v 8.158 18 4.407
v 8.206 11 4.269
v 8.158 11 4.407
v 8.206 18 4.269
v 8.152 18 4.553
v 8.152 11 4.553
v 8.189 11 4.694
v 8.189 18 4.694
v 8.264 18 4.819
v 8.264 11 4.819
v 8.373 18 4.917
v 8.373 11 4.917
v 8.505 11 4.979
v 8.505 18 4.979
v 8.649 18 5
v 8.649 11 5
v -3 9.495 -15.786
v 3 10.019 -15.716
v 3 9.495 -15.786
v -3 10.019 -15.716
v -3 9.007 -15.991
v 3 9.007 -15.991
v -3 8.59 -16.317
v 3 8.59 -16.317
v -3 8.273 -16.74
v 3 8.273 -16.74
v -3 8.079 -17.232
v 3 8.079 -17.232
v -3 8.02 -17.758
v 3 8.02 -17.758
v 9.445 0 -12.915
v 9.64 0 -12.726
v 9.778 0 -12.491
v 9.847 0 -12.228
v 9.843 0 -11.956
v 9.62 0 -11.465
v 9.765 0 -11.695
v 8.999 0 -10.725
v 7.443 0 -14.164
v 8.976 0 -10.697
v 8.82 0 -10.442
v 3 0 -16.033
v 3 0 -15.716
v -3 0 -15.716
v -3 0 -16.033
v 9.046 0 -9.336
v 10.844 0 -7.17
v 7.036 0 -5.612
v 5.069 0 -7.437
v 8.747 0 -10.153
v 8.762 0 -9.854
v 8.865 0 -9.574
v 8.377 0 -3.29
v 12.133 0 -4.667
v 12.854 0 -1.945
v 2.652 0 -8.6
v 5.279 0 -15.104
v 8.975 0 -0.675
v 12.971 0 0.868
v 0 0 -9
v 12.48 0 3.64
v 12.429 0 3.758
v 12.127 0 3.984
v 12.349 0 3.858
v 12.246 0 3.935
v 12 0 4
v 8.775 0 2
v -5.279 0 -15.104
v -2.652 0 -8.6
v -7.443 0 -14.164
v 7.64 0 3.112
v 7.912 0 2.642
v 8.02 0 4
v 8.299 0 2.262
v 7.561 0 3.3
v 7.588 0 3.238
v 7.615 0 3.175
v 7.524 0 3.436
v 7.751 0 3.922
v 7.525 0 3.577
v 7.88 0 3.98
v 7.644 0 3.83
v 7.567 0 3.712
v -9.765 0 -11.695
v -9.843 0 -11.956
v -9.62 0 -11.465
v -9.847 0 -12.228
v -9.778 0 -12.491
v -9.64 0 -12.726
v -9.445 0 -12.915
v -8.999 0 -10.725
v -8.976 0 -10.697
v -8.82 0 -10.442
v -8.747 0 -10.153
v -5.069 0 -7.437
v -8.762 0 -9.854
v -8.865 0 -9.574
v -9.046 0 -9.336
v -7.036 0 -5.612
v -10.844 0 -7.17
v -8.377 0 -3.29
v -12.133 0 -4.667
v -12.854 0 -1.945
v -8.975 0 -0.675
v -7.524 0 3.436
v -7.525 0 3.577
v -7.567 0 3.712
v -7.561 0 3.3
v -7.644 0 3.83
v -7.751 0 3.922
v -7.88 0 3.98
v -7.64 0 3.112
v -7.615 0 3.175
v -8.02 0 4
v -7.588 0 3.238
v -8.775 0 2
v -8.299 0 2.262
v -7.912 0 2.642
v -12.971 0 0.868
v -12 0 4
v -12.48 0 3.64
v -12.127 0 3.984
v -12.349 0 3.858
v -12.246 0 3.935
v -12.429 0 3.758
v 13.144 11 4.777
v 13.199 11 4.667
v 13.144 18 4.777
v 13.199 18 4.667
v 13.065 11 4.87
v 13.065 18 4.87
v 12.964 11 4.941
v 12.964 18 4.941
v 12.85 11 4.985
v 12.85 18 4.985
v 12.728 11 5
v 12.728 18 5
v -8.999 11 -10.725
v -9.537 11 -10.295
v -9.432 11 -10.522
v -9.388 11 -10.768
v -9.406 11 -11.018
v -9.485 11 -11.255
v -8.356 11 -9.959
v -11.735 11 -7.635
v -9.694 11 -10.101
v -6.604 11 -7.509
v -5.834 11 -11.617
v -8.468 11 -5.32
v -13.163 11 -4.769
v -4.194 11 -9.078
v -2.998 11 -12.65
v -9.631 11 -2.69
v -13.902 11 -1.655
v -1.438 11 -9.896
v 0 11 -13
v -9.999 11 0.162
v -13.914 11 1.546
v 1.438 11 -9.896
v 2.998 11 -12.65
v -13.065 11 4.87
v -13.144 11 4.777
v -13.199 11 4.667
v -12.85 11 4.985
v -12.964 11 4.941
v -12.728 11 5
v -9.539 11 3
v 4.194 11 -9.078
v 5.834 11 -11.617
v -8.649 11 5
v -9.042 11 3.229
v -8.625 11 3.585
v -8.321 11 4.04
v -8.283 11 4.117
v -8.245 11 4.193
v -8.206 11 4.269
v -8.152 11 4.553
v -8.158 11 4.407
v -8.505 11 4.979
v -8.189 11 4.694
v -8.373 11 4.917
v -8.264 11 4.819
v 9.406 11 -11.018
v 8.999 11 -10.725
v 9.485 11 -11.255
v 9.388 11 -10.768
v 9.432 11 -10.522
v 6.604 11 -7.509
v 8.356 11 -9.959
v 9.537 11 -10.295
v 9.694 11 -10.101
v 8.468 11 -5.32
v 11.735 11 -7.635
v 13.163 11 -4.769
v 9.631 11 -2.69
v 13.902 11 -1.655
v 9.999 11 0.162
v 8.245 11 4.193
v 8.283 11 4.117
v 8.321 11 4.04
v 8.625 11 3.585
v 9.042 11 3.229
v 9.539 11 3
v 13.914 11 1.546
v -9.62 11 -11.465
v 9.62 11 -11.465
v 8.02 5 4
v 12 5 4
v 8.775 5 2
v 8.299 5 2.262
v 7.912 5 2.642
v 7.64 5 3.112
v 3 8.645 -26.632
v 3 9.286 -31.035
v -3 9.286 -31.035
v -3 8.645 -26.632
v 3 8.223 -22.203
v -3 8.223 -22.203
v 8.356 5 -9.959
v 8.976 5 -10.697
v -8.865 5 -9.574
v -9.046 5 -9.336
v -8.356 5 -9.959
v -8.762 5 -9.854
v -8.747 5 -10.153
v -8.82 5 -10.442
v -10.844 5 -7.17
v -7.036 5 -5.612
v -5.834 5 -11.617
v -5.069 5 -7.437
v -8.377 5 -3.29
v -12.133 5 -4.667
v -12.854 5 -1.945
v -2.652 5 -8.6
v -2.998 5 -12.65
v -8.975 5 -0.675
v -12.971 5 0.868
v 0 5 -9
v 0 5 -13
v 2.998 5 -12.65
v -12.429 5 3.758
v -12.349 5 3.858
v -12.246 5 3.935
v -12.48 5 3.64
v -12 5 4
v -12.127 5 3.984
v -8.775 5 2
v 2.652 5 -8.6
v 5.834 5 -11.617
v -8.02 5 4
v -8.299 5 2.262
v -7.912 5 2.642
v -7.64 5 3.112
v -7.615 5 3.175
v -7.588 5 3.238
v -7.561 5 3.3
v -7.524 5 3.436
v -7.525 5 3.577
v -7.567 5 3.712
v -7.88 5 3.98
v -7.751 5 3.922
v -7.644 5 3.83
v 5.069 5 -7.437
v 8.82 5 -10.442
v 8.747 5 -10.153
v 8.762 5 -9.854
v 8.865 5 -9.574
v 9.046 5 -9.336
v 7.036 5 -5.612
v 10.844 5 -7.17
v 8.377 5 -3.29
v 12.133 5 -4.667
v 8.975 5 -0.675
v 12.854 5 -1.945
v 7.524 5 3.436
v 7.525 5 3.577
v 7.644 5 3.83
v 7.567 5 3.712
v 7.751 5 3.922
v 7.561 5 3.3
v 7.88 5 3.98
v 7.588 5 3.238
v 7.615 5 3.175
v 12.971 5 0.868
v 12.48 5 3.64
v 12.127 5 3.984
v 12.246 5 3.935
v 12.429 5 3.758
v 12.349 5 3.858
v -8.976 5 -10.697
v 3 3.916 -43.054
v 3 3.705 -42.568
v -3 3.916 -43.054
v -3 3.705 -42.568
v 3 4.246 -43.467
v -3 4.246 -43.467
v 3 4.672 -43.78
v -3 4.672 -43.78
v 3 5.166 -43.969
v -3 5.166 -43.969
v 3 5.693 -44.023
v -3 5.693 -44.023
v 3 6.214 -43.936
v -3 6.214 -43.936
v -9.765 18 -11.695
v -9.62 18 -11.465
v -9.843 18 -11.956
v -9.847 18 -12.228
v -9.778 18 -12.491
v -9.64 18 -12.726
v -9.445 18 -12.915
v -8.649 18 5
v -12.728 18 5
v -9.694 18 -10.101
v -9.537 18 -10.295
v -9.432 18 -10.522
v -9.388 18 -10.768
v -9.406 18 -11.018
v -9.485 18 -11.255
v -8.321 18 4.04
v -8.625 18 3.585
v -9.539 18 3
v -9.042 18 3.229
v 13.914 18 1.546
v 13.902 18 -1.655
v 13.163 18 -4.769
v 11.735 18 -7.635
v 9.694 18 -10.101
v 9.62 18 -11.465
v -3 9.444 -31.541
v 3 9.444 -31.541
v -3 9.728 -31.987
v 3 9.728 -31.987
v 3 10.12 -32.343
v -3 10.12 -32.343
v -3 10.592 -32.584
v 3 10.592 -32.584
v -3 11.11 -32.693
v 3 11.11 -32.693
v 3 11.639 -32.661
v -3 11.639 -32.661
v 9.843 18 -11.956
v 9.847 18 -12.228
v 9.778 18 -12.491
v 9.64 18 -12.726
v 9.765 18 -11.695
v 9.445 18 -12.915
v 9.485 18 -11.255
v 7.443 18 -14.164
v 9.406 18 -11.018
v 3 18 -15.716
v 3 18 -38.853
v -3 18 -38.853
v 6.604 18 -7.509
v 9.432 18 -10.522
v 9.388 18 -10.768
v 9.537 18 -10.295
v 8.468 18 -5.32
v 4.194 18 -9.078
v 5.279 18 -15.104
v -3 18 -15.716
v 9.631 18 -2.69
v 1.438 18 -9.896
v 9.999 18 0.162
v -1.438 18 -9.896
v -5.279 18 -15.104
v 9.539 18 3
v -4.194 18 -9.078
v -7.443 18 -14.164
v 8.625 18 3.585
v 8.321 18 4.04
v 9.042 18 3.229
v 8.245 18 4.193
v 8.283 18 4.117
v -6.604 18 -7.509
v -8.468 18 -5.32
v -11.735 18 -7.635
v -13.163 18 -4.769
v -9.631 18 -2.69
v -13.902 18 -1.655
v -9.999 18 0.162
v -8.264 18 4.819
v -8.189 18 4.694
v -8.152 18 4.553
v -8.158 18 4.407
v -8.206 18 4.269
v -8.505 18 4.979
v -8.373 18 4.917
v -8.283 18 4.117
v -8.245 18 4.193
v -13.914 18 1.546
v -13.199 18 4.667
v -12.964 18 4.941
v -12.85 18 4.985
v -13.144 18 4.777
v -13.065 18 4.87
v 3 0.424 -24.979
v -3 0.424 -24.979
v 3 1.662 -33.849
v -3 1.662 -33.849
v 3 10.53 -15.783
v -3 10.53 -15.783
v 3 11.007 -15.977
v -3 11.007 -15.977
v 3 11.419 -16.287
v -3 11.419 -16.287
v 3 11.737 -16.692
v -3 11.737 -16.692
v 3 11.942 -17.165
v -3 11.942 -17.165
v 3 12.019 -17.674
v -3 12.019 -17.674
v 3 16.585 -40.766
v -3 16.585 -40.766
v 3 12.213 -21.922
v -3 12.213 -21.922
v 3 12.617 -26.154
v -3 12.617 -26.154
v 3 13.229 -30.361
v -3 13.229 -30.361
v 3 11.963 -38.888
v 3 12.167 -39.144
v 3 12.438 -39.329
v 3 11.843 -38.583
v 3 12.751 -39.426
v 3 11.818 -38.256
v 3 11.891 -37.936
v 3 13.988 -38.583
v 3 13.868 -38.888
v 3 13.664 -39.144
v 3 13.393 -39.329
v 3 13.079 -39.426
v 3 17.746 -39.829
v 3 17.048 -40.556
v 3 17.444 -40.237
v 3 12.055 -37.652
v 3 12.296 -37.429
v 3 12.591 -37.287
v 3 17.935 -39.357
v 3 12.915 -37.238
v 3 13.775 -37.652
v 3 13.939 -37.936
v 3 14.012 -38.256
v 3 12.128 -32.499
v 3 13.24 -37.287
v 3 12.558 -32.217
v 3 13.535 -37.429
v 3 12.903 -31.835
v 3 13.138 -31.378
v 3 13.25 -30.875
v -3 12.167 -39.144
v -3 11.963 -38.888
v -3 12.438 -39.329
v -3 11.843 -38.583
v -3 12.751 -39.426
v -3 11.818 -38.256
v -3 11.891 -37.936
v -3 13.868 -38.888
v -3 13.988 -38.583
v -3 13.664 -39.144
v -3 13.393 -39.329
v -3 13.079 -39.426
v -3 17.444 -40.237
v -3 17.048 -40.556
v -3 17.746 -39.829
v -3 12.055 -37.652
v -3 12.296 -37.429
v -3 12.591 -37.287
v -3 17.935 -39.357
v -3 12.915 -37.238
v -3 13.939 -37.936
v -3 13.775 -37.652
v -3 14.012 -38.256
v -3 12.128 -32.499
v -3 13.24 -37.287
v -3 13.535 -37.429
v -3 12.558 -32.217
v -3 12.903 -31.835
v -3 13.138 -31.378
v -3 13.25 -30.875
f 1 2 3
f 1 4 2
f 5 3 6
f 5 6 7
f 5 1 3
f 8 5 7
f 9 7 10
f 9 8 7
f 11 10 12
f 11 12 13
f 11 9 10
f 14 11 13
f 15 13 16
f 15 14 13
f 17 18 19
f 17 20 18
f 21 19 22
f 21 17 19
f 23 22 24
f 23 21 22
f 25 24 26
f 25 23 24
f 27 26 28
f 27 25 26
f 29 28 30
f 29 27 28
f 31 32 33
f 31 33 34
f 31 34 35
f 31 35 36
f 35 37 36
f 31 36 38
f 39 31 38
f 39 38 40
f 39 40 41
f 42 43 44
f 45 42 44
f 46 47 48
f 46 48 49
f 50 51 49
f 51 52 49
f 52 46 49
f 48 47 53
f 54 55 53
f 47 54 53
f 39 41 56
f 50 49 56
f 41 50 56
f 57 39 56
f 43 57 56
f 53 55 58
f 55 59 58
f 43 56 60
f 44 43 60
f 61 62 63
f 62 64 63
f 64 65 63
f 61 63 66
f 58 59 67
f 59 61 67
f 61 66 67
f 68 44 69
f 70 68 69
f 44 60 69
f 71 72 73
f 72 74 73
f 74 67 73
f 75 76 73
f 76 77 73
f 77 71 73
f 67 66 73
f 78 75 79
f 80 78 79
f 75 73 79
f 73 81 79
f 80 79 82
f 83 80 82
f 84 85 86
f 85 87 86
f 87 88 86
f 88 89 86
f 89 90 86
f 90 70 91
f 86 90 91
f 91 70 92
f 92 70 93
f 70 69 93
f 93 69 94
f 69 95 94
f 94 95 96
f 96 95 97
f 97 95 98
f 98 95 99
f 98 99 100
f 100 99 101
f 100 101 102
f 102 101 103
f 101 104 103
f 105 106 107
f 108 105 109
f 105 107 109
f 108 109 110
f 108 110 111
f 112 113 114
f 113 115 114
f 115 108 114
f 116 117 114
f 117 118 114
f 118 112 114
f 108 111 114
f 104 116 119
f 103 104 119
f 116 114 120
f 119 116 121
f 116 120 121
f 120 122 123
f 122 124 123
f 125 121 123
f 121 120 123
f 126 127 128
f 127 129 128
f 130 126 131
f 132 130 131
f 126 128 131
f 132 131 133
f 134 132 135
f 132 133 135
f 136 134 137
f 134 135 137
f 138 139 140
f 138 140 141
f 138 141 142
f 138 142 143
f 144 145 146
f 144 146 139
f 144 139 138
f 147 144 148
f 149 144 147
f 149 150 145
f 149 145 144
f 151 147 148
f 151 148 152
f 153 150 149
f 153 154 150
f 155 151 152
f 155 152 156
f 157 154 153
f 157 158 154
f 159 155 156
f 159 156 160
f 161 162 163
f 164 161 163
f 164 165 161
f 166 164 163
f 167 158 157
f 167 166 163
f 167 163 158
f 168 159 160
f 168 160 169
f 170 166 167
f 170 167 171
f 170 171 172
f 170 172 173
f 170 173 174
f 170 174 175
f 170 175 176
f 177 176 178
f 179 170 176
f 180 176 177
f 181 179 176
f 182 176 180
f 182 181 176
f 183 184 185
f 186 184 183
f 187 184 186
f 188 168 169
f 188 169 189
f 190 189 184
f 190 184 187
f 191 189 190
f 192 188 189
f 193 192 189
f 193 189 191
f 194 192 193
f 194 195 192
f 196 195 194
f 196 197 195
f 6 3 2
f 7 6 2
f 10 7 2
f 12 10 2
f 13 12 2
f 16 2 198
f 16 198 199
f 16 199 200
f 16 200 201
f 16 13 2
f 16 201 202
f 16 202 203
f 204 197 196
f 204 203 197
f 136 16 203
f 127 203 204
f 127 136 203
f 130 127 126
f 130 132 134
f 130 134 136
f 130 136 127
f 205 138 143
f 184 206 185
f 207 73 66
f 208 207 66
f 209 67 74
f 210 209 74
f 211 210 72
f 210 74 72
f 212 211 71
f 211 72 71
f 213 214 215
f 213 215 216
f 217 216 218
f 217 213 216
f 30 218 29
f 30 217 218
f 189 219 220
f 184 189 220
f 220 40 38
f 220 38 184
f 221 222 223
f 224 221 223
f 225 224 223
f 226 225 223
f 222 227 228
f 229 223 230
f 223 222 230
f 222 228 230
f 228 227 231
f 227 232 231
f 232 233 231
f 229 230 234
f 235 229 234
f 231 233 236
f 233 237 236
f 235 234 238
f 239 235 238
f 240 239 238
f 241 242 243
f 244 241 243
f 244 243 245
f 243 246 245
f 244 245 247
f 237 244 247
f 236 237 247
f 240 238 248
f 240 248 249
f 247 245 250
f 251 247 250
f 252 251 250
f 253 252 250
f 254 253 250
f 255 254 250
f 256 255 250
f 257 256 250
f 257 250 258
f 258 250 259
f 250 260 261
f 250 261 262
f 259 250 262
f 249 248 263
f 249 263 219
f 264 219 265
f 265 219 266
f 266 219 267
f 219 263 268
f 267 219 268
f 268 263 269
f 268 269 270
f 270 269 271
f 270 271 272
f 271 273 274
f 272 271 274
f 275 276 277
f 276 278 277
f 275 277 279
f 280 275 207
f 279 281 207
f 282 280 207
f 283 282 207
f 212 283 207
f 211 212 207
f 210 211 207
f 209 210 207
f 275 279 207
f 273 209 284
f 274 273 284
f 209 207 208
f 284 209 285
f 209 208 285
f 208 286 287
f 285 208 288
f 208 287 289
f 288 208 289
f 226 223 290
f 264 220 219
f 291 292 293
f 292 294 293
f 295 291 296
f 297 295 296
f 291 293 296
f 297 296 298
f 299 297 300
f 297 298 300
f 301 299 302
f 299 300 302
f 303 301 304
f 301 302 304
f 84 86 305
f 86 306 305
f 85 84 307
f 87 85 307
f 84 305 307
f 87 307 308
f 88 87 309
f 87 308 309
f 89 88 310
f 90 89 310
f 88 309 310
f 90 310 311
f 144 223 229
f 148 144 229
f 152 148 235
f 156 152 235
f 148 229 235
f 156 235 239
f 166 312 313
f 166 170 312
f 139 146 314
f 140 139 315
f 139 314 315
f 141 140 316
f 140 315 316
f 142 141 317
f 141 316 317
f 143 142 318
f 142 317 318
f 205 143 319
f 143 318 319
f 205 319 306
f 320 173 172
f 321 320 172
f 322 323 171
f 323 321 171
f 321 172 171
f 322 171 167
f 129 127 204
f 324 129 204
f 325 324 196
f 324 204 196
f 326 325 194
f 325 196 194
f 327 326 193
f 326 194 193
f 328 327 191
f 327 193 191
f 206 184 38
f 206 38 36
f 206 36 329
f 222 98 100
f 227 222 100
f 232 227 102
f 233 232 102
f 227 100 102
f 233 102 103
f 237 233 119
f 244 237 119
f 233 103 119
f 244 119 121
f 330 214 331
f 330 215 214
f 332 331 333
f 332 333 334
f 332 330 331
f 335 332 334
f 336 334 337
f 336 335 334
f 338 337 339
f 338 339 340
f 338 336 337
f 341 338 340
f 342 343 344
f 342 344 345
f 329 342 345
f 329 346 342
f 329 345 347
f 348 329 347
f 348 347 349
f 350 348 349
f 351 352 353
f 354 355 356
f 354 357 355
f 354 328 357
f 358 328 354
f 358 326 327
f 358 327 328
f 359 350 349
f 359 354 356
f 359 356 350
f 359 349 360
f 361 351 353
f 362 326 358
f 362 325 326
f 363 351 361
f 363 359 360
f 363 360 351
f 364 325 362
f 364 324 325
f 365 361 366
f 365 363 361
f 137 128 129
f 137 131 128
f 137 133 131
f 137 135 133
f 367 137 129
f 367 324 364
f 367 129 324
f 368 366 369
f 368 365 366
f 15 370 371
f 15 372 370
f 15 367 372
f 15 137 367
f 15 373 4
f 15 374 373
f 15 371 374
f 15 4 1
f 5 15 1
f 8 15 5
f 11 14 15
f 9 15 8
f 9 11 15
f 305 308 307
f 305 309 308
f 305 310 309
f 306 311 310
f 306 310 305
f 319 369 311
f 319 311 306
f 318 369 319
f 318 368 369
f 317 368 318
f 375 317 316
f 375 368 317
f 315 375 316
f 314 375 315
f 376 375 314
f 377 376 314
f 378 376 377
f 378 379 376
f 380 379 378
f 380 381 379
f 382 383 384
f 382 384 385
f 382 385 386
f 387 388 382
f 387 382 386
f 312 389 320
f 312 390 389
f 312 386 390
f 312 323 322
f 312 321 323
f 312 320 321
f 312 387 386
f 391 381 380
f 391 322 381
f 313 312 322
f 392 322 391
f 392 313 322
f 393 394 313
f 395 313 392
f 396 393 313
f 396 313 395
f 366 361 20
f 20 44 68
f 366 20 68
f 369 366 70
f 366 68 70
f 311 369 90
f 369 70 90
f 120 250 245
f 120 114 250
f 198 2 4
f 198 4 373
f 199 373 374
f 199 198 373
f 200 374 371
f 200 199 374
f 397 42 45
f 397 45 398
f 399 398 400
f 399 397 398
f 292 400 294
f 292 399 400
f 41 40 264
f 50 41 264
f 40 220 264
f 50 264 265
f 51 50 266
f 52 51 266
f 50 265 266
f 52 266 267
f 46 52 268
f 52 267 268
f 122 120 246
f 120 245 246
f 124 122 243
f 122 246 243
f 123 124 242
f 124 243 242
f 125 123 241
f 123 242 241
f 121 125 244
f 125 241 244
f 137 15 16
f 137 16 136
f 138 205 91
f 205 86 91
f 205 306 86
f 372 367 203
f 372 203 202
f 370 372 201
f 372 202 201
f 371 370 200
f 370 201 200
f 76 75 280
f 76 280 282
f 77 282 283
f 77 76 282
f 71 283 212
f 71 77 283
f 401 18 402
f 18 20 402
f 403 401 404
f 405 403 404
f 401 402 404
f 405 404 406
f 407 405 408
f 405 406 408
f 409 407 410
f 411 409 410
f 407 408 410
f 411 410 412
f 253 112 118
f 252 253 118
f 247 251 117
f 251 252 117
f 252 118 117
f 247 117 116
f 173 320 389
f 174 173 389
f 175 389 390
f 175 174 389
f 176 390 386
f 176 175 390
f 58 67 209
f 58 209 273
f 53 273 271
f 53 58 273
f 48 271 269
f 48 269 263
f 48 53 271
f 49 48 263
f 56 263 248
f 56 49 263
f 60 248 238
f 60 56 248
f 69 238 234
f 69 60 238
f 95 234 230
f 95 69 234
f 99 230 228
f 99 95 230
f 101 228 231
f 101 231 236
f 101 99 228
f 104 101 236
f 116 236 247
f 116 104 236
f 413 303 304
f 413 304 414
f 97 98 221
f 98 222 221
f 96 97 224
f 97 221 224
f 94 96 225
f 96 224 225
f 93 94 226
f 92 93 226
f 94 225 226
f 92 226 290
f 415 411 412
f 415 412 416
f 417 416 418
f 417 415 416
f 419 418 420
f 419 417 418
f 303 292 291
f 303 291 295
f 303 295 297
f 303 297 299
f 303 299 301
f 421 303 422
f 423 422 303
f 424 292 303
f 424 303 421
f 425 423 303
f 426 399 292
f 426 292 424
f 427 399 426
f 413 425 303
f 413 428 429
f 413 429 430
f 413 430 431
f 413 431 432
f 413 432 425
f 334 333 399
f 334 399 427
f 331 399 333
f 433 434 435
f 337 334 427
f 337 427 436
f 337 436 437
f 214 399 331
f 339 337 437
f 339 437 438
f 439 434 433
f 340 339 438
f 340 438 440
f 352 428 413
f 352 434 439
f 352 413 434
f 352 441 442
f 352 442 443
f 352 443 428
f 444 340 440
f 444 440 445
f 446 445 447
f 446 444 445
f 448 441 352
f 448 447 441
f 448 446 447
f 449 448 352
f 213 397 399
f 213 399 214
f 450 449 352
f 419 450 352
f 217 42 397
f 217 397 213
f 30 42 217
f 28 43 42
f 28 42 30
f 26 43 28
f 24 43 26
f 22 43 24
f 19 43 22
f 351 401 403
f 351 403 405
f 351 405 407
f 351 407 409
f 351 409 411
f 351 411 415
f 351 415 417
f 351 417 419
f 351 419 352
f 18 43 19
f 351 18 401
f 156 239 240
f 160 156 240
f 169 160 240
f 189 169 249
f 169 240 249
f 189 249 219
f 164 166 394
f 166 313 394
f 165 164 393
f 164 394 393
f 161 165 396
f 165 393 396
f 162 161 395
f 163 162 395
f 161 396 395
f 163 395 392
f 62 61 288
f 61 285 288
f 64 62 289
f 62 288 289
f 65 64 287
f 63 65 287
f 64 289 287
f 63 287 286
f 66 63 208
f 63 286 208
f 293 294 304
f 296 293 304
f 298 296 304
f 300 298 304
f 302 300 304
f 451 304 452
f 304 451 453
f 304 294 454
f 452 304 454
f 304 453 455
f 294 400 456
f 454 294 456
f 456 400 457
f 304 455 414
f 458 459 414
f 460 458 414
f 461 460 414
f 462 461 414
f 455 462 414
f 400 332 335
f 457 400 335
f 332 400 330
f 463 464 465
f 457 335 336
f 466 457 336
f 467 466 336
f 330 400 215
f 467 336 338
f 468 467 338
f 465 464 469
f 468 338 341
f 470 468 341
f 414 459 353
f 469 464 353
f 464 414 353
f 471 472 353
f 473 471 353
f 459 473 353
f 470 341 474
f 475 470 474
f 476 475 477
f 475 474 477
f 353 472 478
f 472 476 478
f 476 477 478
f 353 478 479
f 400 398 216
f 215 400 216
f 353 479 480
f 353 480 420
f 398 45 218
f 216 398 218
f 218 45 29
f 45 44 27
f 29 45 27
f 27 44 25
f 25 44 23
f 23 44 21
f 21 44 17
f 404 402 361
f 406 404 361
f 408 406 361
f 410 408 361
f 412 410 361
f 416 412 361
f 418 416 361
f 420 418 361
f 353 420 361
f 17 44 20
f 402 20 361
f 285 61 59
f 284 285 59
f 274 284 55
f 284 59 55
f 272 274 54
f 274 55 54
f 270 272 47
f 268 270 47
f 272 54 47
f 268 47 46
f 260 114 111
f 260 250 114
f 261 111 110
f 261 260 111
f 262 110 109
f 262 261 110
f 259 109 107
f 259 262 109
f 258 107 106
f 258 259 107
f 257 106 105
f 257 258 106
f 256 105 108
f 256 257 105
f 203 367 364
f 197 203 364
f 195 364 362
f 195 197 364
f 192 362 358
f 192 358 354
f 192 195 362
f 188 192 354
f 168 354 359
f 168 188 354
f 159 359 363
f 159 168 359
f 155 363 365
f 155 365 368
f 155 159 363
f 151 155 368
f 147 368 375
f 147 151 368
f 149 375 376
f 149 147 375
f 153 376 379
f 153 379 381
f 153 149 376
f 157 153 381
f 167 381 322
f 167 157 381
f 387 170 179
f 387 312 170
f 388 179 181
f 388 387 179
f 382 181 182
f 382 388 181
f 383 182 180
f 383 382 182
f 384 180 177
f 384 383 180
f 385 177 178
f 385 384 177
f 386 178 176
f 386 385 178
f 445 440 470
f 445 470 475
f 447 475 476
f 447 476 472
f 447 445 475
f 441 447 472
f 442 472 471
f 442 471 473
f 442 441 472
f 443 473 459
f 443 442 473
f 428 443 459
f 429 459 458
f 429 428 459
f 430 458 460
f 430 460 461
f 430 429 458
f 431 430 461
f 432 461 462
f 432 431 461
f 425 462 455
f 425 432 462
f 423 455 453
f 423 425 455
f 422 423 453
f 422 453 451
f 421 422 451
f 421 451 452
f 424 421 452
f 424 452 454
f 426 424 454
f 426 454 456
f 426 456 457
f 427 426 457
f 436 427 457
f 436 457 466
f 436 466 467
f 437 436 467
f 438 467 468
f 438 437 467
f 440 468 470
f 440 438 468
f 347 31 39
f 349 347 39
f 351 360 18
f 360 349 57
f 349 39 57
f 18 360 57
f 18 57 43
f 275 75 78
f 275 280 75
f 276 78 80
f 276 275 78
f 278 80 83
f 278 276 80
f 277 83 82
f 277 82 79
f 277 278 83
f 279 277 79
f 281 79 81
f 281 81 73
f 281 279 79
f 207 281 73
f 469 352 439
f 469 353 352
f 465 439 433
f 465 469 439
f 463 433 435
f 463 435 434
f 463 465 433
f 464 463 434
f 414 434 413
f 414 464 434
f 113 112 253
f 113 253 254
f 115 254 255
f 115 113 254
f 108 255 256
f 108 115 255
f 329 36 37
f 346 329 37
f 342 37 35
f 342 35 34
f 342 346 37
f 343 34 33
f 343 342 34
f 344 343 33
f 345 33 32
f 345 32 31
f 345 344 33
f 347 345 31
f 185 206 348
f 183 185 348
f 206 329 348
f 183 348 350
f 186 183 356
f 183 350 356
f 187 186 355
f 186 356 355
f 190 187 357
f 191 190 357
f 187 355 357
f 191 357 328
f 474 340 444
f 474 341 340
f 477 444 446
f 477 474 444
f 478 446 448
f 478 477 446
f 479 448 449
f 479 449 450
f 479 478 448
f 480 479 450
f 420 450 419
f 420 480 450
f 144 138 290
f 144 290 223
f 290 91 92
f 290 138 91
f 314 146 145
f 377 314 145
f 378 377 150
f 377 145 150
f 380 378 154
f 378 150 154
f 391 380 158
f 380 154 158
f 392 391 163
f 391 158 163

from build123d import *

# Parameters (mm, degrees)
SKETCH1_R              = 13
SKETCH1_R_2            = 9
BOSS_EXTRUDE1_DEPTH    = 5
SKETCH2_R              = 14
SKETCH2_R_2            = 10
BOSS_EXTRUDE2_DEPTH    = 7
CUT_EXTRUDE1_DEPTH     = 7
BOSS_EXTRUDE3_DEPTH    = 5
FILLET1_R              = 2
FILLET2_R              = 0.5
CUT_EXTRUDE2_DEPTH     = 9
BOSS_EXTRUDE4_DEPTH    = 7
FILLET3_R              = 2
FILLET4_R              = 0.5
BOSS_EXTRUDE5_START    = -18
BOSS_EXTRUDE5_DEPTH    = 18
BOSS_EXTRUDE6_START    = -18
BOSS_EXTRUDE6_DEPTH    = 18
SKETCH7_W              = 6
SKETCH7_H              = 18
BOSS_EXTRUDE7_DEPTH    = 28
FILLET5_R              = 1
CUT_EXTRUDE3_START     = -6
CUT_EXTRUDE3_OUTLINE_R = 1.1
CUT_EXTRUDE3_DEPTH     = 6
FILLET7_R              = 2


# Read off the part's stored shape, not the designer's step: Boss-Extrude6, Cut-Extrude3
# Some blends are built 0.0001 mm under size
with BuildPart() as part:
    # Sketch1 → Boss-Extrude1 (new body)
    with BuildSketch(Plane(origin=(0, 0, 0), x_dir=(1, 0, 0), z_dir=(0, 1, 0))):
        with Locations(Location((0, 0, 0), (0, 0, 270))):
            Circle(SKETCH1_R)
        with Locations(Location((0, 0, 0), (0, 0, 270))):
            Circle(SKETCH1_R_2, mode=Mode.SUBTRACT)
    extrude(amount=BOSS_EXTRUDE1_DEPTH)

    # Sketch3 → Cut-Extrude1 (cut)
    with BuildSketch(Plane.XZ):
        with BuildLine():
            ThreePointArc((12.369316877, 4), (0, 13), (-12.369316877, 4))
            Line((-12.369316877, 4), (-8.062257748, 4))
            ThreePointArc((-8.062257748, 4), (0, 9), (8.062257748, 4))
            Line((8.062257748, 4), (12.369316877, 4))
        make_face()
    extrude(amount=-CUT_EXTRUDE1_DEPTH, mode=Mode.SUBTRACT)

    # Sketch3<3> → Boss-Extrude3 (add)
    with BuildSketch(Plane.XZ):
        with BuildLine():
            Line((-7.215434845, 4), (-8.062257748, 4))
            ThreePointArc((-8.062257748, 4), (-8.477795251, 3.02109048), (-8.774964387, 2))
            Line((-8.774964387, 2), (-8.003905297, 2))
            ThreePointArc((-8.003905297, 2), (-7.675094696, 3.025792692), (-7.215434845, 4))
        make_face()
        with BuildLine():
            ThreePointArc((8.774964387, 2), (8.477795251, 3.02109048), (8.062257748, 4))
            Line((8.062257748, 4), (7.215434845, 4))
            ThreePointArc((7.215434845, 4), (7.675094696, 3.025792692), (8.003905297, 2))
            Line((8.003905297, 2), (8.774964387, 2))
        make_face()
    extrude(amount=-BOSS_EXTRUDE3_DEPTH)

    # Fillet1
    # the kernel refuses this fillet: 2 mm, written as the material it takes off along each edge
    with BuildSketch(Plane(origin=(8.003905297, -2.925457541, 2), x_dir=(-0.3106184744402921, 0, 0.9505346723483502), z_dir=(0, 1, 0))) as fillet1_piece_1:
        with BuildLine():
            CenterArc((1.312023382, 1.994963987), FILLET1_R, 219.12562277, 46.807536055)
            Line((-0.239505198, 0.7329184), (-0.27053577, 0.707677488))
            ThreePointArc((-0.27053577, 0.707677488), (-0.157773986, 0.354034461), (-0.038021387, -0.012424739))
            Line((-0.038021387, -0.012424739), (0.002836807, -0.03989928))
            ThreePointArc((0.002836807, -0.03989928), (0.585091508, -0.019226448), (1.167346209, -0.03989928))
            Line((1.167346209, -0.03989928), (1.170183016, 0))
        make_face()
    extrude(amount=10.850915082, mode=Mode.SUBTRACT)
    with BuildSketch(Plane(origin=(-8.003905297, -2.925457541, 2), x_dir=(-1, 0, 0), z_dir=(0, 1, 0))) as fillet1_piece_2:
        with BuildLine():
            CenterArc((1.488743739, 1.866796386), FILLET1_R, 202.16334775, 46.807536055)
            Line((-0.363480463, 1.11229953), (-0.400524947, 1.097209593))
            ThreePointArc((-0.400524947, 1.097209593), (-0.200015637, 0.550177675), (-0.038806814, -0.00969697))
            Line((-0.038806814, -0.00969697), (0, -0.04))
            ThreePointArc((0, -0.04), (0.385529545, -0.04), (0.756705398, -0.037335928))
            Line((0.756705398, -0.037335928), (0.771059091, 0))
        make_face()
    extrude(amount=10.850915082, mode=Mode.SUBTRACT)

    # Fillet2
    fillet2_edges = [part.edges().sort_by_distance(p)[0] for p in [
        (-12.369316877, 2.5, 4),
        (12.369316877, 2.5, 4),
        (-7.215434845, 2.5, 4),
        (7.215434845, 2.5, 4),
    ]]
    fillet(fillet2_edges, radius=FILLET2_R)



with BuildPart() as body_2:
    # Sketch2 → Boss-Extrude2 (new body)
    with BuildSketch(Plane(origin=(0, 11, 0), x_dir=(1, 0, 0), z_dir=(0, 1, 0))):
        with Locations(Location((0, 0, 0), (0, 0, 270))):
            Circle(SKETCH2_R)
        with Locations(Location((0, 0, 0), (0, 0, 270))):
            Circle(SKETCH2_R_2, mode=Mode.SUBTRACT)
    extrude(amount=BOSS_EXTRUDE2_DEPTH)

    # Sketch4 → Cut-Extrude2 (cut)
    with BuildSketch(Plane.XZ.offset(-11)):
        with BuildLine():
            ThreePointArc((13.076696831, 5), (0, 14), (-13.076696831, 5))
            Line((-13.076696831, 5), (-8.660254038, 5))
            ThreePointArc((-8.660254038, 5), (0, 10), (8.660254038, 5))
            Line((8.660254038, 5), (13.076696831, 5))
        make_face()
    extrude(amount=-CUT_EXTRUDE2_DEPTH, mode=Mode.SUBTRACT)

    # Sketch4<3> → Boss-Extrude4 (add)
    with BuildSketch(Plane.XZ.offset(-11)):
        with BuildLine():
            Line((-7.782191208, 5), (-8.660254038, 5))
            ThreePointArc((-8.660254038, 5), (-9.154604257, 4.02408013), (-9.539392014, 3))
            Line((-9.539392014, 3), (-8.75, 3))
            ThreePointArc((-8.75, 3), (-8.326363944, 4.029164115), (-7.782191208, 5))
        make_face()
        with BuildLine():
            ThreePointArc((9.539392014, 3), (9.154604257, 4.02408013), (8.660254038, 5))
            Line((8.660254038, 5), (7.782191208, 5))
            ThreePointArc((7.782191208, 5), (8.326363944, 4.029164115), (8.75, 3))
            Line((8.75, 3), (9.539392014, 3))
        make_face()
    extrude(amount=-BOSS_EXTRUDE4_DEPTH)

    # Fillet3
    # the kernel refuses this fillet: 2 mm, written as the material it takes off along each edge
    with BuildSketch(Plane(origin=(-8.75, 8.186857883, 3), x_dir=(-1, 0, 0), z_dir=(0, 1, 0))) as fillet3_piece_1:
        with BuildLine():
            CenterArc((1.370115418, 1.913833934), FILLET3_R, 205.898945897, 47.221442291)
            Line((-0.429016212, 1.040263457), (-0.464998845, 1.022792048))
            ThreePointArc((-0.464998845, 1.022792048), (-0.235653724, 0.511411041), (-0.037837838, -0.012972973))
            Line((-0.037837838, -0.012972973), (0, -0.04))
            ThreePointArc((0, -0.04), (0.394696007, -0.04), (0.777777546, -0.038276679))
            Line((0.777777546, -0.038276679), (0.789392014, 0))
        make_face()
    extrude(amount=12.626284233, mode=Mode.SUBTRACT)
    with BuildSketch(Plane(origin=(8.75, 8.186857883, 3), x_dir=(-0.3812606993131178, 0, 0.9244675652283711), z_dir=(0, 1, 0))) as fillet3_piece_2:
        with BuildLine():
            CenterArc((1.246906235, 1.996296928), FILLET3_R, 219.291406968, 47.221442291)
            Line((-0.300964151, 0.729767313), (-0.331921559, 0.704436721))
            ThreePointArc((-0.331921559, 0.704436721), (-0.187460778, 0.349633229), (-0.036978703, -0.015250428))
            Line((-0.036978703, -0.015250428), (0.002432988, -0.039925939))
            ThreePointArc((0.002432988, -0.039925939), (0.562628423, -0.022873294), (1.122823859, -0.039925939))
            Line((1.122823859, -0.039925939), (1.125256847, 0))
        make_face()
    extrude(amount=12.626284233, mode=Mode.SUBTRACT)

    # Fillet4
    fillet4_edges = [body_2.edges().sort_by_distance(p)[0] for p in [
        (-13.076696831, 14.5, 5),
        (13.076696831, 14.5, 5),
        (-7.782191208, 14.5, 5),
        (7.782191208, 14.5, 5),
    ]]
    fillet(fillet4_edges, radius=FILLET4_R)


with BuildPart() as part_1:
    add(part.part)

    add(body_2.part)  # Boss-Extrude5 merges body 2
    # Sketch5 → Boss-Extrude5 (add)
    with BuildSketch(Plane(origin=(0, 18, 0), x_dir=(1, 0, 0), z_dir=(0, 1, 0)).offset(BOSS_EXTRUDE5_START)):
        with BuildLine():
            ThreePointArc((0, 14), (4.788282007, 13.155696691), (8.999026536, 10.724622204))
            Line((8.999026536, 10.724622204), (10.284601755, 12.25671109))
            ThreePointArc((10.284601755, 12.25671109), (0, 16), (-10.284601755, 12.25671109))
            Line((-10.284601755, 12.25671109), (-8.999026536, 10.724622204))
            ThreePointArc((-8.999026536, 10.724622204), (-4.788282007, 13.155696691), (0, 14))
        make_face()
        with BuildLine():
            ThreePointArc((0, 13), (4.446261863, 12.21600407), (8.356238926, 9.958577761))
            Line((8.356238926, 9.958577761), (8.999026536, 10.724622204))
            ThreePointArc((8.999026536, 10.724622204), (4.788282007, 13.155696691), (0, 14))
            Line((0, 14), (0, 13))
        make_face()
        with BuildLine():
            Line((-8.999026536, 10.724622204), (-8.356238926, 9.958577761))
            ThreePointArc((-8.356238926, 9.958577761), (-4.446261863, 12.21600407), (0, 13))
            Line((0, 13), (0, 14))
            ThreePointArc((0, 14), (-4.788282007, 13.155696691), (-8.999026536, 10.724622204))
        make_face()
    extrude(amount=BOSS_EXTRUDE5_DEPTH)

    # Boss-Extrude6 outline → Boss-Extrude6 (add)
    with BuildSketch(Plane(origin=(0, 18, 0), x_dir=(1, 0, 0), z_dir=(0, 1, 0)).offset(BOSS_EXTRUDE6_START)):
        with BuildLine():
            ThreePointArc((-3, 15.716233646), (0, 16), (3, 15.716233646))
            Line((3, 15.716233646), (3, 17.5))
            Line((3, 17.5), (-3, 17.5))
            Line((-3, 17.5), (-3, 15.716233646))
        make_face()
    extrude(amount=BOSS_EXTRUDE6_DEPTH)

    # Sketch7 → Boss-Extrude7 (add)
    with BuildSketch(Plane(origin=(0, 0, -17.5), x_dir=(-1, 0, 0), z_dir=(0, 0, -1))):
        with Locations((0, 9)):
            Rectangle(SKETCH7_W, SKETCH7_H)
    extrude(amount=BOSS_EXTRUDE7_DEPTH)

    # Fillet5
    fillet5_edges = [part_1.edges().sort_by_distance(p)[0] for p in [
        (-8.356238926, 2.5, -9.958577761),
        (-8.999026536, 14.5, -10.724622204),
        (8.356238926, 2.5, -9.958577761),
        (8.999026536, 14.5, -10.724622204),
        (10.284601755, 9, -12.25671109),
        (-10.284601755, 9, -12.25671109),
    ]]
    fillet(fillet5_edges, radius=FILLET5_R - 0.0001)  # a hair under: the kernel refuses the full size

    # Cut-Extrude3 outline → Cut-Extrude3 (cut)
    with BuildSketch(Plane.ZY.offset(3).offset(CUT_EXTRUDE3_START)):
        with BuildLine():
            ThreePointArc((-16.032782087, 0), (-30.438112209, 1.0880478), (-44.526972297, 4.282011691))
            Line((-44.526972297, 4.282011691), (-40.332962383, 18))
            Line((-40.332962383, 18), (-45.5, 18))
            Line((-45.5, 18), (-45.5, 0))
            Line((-45.5, 0), (-16.032782087, 0))
        make_face()
        with Locations((-38.338138622, 12.915422706)):
            Circle(CUT_EXTRUDE3_OUTLINE_R)
        with BuildLine():
            Line((-32.284081469, 13.580062224), (-33.04731745, 9.65355349))
            ThreePointArc((-33.04731745, 9.65355349), (-24.421849449, 8.406791821), (-15.716233646, 8.000139171))
            Line((-15.716233646, 8.000139171), (-15.716233646, 12.000145644))
            ThreePointArc((-15.716233646, 12.000145644), (-24.038466281, 12.388378225), (-32.284081469, 13.580062224))
        make_face()
    extrude(amount=CUT_EXTRUDE3_DEPTH, mode=Mode.SUBTRACT)

    # Fillet7
    fillet7_edges = [part_1.edges().sort_by_distance(p)[0] for p in [
        (0, 12.000145644, -15.716233646),
        (0, 8.000139171, -15.716233646),
        (0, 9.65355349, -33.04731745),
        (0, 13.580062224, -32.284081469),
        (0, 18, -40.332962383),
        (0, 4.282011691, -44.526972297),
    ]]
    fillet(fillet7_edges, radius=FILLET7_R - 0.0001)  # a hair under: the kernel refuses the full size


solid = part_1.part
